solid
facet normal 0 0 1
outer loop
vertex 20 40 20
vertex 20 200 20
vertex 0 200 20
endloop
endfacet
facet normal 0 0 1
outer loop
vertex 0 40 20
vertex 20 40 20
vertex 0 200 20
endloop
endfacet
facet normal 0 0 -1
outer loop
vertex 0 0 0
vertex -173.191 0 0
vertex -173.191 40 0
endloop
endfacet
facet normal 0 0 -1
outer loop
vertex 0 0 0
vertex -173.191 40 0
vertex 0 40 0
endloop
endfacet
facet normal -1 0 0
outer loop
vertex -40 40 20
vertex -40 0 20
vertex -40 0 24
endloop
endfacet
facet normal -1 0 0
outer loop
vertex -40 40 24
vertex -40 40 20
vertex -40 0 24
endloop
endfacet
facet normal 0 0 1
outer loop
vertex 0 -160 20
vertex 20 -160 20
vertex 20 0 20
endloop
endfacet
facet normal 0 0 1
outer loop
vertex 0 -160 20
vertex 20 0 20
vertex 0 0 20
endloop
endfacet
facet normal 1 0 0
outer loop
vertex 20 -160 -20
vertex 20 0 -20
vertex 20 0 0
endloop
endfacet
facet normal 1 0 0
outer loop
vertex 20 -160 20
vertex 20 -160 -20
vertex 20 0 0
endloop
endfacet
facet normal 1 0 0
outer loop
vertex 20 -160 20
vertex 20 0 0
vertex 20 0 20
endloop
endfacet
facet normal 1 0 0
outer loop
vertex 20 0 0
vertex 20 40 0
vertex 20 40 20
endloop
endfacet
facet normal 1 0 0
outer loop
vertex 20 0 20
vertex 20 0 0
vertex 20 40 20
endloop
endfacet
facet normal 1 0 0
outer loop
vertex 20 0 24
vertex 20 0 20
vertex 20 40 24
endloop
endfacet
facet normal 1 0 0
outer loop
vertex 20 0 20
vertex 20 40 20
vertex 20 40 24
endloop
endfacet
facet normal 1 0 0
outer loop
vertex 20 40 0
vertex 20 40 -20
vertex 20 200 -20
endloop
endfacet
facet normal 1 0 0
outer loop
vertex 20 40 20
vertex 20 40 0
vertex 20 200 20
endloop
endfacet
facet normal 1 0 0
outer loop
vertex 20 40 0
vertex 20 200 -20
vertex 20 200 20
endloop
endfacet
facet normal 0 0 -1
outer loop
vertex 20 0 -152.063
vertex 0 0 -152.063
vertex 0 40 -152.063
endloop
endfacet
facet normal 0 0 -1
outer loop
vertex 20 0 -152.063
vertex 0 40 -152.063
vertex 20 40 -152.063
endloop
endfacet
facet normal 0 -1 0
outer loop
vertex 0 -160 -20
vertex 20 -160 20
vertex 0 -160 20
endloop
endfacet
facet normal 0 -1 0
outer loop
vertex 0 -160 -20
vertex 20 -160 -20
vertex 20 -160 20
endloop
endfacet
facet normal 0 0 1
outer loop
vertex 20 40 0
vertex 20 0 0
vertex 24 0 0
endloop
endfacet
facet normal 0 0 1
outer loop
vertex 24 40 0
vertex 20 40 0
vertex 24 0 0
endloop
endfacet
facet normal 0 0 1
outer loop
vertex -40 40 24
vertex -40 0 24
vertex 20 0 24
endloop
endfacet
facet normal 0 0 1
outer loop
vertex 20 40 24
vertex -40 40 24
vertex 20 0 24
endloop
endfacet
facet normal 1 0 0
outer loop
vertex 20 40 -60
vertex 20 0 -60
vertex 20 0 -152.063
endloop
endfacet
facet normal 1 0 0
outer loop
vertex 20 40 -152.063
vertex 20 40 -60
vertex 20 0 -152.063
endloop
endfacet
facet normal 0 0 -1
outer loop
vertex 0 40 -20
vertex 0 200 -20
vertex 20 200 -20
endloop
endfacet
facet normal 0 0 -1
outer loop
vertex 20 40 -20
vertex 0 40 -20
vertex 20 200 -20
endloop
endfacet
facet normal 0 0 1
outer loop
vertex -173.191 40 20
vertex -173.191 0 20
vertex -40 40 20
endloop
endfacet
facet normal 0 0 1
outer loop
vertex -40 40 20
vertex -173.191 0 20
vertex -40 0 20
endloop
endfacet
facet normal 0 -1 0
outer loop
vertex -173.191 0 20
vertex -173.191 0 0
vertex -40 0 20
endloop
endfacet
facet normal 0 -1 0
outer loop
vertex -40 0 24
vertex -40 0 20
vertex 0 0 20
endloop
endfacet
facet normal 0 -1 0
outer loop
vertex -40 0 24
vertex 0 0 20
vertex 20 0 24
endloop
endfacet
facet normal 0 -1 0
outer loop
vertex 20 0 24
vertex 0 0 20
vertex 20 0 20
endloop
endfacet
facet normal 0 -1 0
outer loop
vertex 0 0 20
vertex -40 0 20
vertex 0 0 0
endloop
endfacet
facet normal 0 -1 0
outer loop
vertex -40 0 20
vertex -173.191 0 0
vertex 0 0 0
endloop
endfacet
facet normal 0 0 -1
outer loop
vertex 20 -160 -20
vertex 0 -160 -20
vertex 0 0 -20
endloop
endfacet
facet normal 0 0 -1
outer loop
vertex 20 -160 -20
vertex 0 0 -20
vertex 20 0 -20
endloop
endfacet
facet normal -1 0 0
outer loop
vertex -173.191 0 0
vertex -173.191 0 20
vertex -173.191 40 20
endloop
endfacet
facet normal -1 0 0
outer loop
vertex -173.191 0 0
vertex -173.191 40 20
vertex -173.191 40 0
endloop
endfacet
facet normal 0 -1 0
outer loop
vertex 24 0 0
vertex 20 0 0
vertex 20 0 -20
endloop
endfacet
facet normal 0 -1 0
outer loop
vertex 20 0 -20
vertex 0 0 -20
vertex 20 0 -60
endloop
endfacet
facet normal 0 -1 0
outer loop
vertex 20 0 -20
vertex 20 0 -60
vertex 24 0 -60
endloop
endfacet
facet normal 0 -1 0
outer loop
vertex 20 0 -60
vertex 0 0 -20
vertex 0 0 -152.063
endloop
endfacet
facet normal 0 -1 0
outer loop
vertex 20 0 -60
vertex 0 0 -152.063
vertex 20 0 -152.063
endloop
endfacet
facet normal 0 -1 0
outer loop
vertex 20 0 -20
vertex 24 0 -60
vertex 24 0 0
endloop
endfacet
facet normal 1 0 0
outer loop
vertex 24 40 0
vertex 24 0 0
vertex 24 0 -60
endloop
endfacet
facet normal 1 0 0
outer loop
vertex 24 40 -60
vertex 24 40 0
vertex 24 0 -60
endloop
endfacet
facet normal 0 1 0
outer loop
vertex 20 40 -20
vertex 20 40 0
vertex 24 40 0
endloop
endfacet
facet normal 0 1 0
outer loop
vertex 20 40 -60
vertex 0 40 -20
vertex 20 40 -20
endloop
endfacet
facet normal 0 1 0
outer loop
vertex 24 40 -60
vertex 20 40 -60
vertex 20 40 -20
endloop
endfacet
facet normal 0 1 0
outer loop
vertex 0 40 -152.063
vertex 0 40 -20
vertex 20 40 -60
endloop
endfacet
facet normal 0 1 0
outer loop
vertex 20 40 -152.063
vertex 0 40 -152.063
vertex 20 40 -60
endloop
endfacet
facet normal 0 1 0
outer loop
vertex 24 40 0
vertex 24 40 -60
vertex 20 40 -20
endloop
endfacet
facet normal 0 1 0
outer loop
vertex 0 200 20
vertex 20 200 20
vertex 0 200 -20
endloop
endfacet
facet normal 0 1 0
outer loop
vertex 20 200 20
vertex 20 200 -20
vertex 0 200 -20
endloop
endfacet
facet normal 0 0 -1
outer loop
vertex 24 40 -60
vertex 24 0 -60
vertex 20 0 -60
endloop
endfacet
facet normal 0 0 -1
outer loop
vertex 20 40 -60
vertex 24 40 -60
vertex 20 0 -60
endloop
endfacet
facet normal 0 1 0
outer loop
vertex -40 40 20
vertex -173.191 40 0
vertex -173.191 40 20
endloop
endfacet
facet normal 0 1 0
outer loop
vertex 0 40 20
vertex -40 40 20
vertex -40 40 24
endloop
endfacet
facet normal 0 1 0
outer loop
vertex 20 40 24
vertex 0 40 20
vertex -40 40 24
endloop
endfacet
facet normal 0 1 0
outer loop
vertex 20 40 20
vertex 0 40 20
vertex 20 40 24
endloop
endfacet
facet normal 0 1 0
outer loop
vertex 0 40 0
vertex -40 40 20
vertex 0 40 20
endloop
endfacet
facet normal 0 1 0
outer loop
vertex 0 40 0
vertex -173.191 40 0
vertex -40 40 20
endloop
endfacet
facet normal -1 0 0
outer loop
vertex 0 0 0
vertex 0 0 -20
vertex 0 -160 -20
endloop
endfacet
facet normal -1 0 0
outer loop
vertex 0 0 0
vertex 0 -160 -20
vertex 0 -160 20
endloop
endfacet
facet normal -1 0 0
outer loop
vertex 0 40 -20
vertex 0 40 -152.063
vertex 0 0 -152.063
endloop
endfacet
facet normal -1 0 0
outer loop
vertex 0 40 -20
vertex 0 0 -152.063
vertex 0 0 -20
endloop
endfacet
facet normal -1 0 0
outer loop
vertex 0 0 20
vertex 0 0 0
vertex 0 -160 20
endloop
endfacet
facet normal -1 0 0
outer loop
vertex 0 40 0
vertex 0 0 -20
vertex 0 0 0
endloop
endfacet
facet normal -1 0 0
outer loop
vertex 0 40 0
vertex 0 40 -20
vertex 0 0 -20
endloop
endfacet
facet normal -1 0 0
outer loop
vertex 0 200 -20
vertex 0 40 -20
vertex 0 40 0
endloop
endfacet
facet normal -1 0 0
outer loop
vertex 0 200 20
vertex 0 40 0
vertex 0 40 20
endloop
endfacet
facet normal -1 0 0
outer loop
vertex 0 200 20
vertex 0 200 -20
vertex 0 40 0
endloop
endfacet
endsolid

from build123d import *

# Parameters (mm, degrees)
BOSS_EXTRUDE1_DEPTH      = 40
BOSS_EXTRUDE2_DEPTH      = 200
BOSS_EXTRUDE2_DEPTH_BACK = 160


with BuildPart() as part:
    # Sketch1 → Boss-Extrude1 (new body)
    with BuildSketch(Plane(origin=(0, 0, 0), x_dir=(1, 0, 0), z_dir=(0, 1, 0))):
        Polygon((-173.191489362, -20), (-40, -20), (-40, -24), (20, -24), (20, 0), (24, 0), (24, 60), (20, 60), (20, 152.062590847), (0, 152.062590847), (0, 0), (-173.191489362, 0), align=None)
    extrude(amount=BOSS_EXTRUDE1_DEPTH)

    # Sketch1<3> → Boss-Extrude2 (add, two sides: drawn at the far end of the back side and taken through both)
    with BuildSketch(Plane(origin=(0, 0, 0), x_dir=(1, 0, 0), z_dir=(0, 1, 0)).offset(-BOSS_EXTRUDE2_DEPTH_BACK)):
        Polygon((0, 20), (0, 0), (0, -20), (20, -20), (20, 0), (20, 20), align=None)
    extrude(amount=BOSS_EXTRUDE2_DEPTH + BOSS_EXTRUDE2_DEPTH_BACK)


solid = part.part
